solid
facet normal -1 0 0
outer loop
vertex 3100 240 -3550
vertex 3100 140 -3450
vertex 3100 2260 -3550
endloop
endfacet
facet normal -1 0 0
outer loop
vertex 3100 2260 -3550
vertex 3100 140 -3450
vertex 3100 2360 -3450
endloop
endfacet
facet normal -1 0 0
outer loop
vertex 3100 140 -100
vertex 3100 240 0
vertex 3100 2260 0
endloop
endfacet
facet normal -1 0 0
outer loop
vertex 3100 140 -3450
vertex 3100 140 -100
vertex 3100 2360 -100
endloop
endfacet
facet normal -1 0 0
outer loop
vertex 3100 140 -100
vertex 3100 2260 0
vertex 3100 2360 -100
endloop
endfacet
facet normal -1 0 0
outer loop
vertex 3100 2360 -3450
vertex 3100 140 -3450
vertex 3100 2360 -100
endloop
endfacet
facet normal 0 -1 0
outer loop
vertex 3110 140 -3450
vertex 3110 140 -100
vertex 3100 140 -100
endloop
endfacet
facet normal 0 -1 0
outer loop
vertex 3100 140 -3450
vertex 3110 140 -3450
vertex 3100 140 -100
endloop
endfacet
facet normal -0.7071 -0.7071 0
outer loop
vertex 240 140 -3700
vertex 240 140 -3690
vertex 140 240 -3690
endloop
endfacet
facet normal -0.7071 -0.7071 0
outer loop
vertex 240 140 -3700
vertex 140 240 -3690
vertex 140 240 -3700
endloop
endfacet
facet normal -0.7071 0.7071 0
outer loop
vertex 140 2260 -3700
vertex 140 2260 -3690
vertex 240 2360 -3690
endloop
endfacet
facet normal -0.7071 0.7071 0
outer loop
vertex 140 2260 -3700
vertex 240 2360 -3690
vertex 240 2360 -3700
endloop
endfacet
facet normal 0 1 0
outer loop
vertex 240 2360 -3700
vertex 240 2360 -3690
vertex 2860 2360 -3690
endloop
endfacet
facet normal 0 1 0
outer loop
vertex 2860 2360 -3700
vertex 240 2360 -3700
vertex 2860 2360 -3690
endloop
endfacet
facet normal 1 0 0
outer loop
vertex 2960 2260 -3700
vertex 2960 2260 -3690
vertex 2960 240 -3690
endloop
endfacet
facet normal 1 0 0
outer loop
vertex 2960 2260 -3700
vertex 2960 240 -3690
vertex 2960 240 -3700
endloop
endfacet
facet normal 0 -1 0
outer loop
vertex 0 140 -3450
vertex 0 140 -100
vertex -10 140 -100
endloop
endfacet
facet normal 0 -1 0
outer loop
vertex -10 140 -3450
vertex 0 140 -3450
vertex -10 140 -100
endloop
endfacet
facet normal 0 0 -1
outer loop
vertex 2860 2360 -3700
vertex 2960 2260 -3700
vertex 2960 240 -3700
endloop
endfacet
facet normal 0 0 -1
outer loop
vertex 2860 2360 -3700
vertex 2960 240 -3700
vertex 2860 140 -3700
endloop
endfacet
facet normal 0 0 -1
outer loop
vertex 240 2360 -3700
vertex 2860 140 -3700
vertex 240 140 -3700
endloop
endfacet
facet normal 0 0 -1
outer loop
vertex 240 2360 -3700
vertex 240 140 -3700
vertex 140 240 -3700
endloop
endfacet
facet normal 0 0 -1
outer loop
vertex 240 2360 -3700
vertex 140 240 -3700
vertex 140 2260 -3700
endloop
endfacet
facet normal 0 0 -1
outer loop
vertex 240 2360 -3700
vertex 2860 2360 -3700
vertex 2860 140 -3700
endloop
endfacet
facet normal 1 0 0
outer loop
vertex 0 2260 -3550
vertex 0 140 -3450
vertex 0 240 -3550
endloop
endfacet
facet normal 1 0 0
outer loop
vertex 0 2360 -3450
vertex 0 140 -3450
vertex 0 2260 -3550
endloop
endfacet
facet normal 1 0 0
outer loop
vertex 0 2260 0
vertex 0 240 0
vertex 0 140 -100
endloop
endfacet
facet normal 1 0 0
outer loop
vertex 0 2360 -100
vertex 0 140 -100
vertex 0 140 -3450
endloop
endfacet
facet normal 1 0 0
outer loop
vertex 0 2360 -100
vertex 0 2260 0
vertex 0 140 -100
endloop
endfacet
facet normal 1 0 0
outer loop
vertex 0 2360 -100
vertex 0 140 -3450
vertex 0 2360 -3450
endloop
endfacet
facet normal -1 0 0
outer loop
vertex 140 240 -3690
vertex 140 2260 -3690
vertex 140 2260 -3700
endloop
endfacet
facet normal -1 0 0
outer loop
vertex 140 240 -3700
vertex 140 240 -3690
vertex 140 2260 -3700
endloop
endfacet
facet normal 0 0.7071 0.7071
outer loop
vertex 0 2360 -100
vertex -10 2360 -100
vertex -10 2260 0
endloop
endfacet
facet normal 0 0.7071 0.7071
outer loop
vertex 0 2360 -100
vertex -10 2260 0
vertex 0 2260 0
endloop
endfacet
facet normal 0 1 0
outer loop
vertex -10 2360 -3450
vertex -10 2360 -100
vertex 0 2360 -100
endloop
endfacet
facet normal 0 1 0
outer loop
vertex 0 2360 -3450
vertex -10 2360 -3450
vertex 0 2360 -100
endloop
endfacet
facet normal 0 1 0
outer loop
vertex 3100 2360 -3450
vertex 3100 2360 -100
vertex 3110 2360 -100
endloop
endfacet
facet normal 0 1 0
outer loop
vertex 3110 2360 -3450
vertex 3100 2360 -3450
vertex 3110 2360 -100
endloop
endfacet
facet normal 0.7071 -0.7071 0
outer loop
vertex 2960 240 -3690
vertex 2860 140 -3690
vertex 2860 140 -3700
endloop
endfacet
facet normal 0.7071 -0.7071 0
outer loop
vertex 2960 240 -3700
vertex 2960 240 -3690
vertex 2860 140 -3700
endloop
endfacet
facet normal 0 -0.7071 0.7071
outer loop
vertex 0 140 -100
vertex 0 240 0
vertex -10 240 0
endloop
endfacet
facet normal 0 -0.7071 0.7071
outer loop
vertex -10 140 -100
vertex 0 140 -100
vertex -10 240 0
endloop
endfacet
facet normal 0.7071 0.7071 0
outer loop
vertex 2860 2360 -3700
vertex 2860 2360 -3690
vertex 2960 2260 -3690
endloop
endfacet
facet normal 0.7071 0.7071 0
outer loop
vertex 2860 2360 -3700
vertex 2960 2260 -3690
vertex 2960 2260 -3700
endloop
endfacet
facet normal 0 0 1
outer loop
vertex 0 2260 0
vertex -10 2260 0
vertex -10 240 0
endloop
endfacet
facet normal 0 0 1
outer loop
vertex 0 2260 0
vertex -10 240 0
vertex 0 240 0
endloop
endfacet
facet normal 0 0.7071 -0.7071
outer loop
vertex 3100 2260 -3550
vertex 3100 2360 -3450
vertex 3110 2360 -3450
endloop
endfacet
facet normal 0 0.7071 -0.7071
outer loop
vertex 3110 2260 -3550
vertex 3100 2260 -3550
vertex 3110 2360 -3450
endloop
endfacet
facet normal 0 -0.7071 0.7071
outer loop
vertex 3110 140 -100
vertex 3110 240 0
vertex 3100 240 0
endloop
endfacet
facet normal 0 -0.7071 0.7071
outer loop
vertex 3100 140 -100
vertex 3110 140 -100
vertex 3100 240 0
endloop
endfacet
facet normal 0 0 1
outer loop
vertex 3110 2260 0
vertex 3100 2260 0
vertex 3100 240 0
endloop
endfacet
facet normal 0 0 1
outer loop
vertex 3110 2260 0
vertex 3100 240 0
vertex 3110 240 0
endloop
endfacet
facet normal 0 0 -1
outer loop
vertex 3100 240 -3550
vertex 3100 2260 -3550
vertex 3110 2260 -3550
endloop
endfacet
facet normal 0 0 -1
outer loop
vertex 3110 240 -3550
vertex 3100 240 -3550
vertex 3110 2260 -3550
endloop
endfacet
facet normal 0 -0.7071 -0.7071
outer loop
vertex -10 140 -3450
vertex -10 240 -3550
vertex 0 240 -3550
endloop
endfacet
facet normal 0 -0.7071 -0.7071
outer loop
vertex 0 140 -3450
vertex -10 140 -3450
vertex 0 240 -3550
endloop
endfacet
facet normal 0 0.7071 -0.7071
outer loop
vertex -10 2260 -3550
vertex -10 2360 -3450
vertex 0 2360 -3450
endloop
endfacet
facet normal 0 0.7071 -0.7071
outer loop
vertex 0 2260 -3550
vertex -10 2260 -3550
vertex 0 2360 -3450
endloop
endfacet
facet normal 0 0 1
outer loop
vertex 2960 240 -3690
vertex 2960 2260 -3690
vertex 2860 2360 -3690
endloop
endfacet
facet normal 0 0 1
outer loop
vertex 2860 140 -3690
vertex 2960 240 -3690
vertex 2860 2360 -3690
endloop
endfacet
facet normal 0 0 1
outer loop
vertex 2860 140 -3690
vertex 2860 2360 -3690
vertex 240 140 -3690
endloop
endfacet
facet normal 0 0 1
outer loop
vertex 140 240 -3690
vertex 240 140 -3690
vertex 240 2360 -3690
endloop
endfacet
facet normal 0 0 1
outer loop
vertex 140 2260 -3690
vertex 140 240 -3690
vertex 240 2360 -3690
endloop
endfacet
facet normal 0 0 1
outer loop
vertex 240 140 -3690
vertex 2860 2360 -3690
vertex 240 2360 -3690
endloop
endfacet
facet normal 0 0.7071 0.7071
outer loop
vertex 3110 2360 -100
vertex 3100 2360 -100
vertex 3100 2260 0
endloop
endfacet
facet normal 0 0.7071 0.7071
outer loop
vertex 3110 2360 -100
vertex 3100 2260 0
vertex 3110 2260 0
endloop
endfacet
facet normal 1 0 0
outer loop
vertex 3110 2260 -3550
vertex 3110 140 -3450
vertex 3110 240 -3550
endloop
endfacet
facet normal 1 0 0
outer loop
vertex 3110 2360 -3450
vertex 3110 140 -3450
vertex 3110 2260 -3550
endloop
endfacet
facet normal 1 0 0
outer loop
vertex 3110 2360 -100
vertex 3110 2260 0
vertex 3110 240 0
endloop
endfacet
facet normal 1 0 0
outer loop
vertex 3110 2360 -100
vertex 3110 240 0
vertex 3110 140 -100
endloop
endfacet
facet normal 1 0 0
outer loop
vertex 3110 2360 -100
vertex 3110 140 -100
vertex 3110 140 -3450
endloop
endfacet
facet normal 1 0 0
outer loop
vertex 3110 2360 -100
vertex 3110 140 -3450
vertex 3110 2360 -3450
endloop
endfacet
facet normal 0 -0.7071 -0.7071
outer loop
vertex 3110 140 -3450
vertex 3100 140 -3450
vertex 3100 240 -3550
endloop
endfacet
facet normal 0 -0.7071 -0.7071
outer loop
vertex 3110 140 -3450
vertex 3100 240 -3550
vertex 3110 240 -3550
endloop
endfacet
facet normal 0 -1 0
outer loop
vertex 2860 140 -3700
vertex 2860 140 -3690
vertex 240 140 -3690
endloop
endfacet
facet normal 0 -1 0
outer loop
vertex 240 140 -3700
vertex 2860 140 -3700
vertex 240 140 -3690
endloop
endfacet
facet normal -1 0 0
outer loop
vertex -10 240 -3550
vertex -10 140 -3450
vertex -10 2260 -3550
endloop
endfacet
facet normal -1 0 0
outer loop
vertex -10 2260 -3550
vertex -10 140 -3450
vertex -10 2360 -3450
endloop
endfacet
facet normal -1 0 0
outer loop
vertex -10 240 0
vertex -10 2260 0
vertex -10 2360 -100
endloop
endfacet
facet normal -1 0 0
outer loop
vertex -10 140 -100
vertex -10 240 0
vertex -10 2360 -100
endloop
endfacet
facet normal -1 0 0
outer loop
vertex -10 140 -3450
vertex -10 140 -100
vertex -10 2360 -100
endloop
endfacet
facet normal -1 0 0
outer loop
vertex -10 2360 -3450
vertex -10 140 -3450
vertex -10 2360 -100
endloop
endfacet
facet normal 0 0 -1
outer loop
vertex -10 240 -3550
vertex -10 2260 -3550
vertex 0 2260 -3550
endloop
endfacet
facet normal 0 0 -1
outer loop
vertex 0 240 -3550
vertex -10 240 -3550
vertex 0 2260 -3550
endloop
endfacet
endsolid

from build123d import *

# Parameters (mm, degrees)
ESQUISSE1_W             = 3120
ESQUISSE1_H             = 2520
ESQUISSE1_W_2           = 3100
ESQUISSE1_H_2           = 2500
EXTRU_MINCE1_DEPTH      = 3700
ESQUISSE3_W             = 3100
ESQUISSE3_H             = 2500
BOSS_EXTRU_1_DEPTH      = 10
ENL_V_MAT_EXTRU_1_DEPTH = 4000
ESQUISSE4_W             = 190.988555417
ESQUISSE4_H             = 256.995888021
ENL_V_MAT_EXTRU_2_DEPTH = 3025.2
CHANFREIN1_SIZE         = 100
CHANFREIN2_SIZE         = 100
CHANFREIN3_SIZE         = 100


with BuildPart() as part:
    # Esquisse1 → Extru.-Mince1 (new body)
    with BuildSketch(Plane.XY):
        with Locations((1550, 1250)):
            Rectangle(ESQUISSE1_W, ESQUISSE1_H)
        with Locations((1550, 1250)):
            Rectangle(ESQUISSE1_W_2, ESQUISSE1_H_2, mode=Mode.SUBTRACT)
    extrude(amount=-EXTRU_MINCE1_DEPTH)

    # Esquisse3 → Boss.-Extru.1 (add)
    with BuildSketch(Plane(origin=(0, 0, -3700), x_dir=(-1, 0, 0), z_dir=(0, 0, -1))):
        with Locations((-1550, 1250)):
            Rectangle(ESQUISSE3_W, ESQUISSE3_H)
    extrude(amount=-BOSS_EXTRU_1_DEPTH)

    # Esquisse2 → Enlèv. mat.-Extru.1 (cut)
    with BuildSketch(Plane.XY):
        Polygon((-60, 2560), (140, 2560), (140, 2500), (2960, 2500), (2960, 2560), (3160, 2560), (3160, 2360), (2960, 2360), (140, 2360), (-60, 2360), align=None)
        Polygon((2960, 140), (140, 140), (-60, 140), (-60, -60), (140, -60), (140, 0), (2960, 0), (2960, -60), (3160, -60), (3160, 140), align=None)
    extrude(amount=-ENL_V_MAT_EXTRU_1_DEPTH, mode=Mode.SUBTRACT)


with BuildPart() as enl_v_mat_extru_1_kept_piece:
    # of the separate pieces the step leaves, the one the design keeps (enl_v_mat_extru_1_pieces_kept)
    add(part.part.solids().sort_by_distance((3110, 140, 0))[0])

    # Esquisse4 → Enlèv. mat.-Extru.2 (cut)
    with BuildSketch(Plane(origin=(0, 2360, 0), x_dir=(1, 0, 0), z_dir=(0, 1, 0))):
        with Locations((44.505722291, 3678.49794401)):
            Rectangle(ESQUISSE4_W, ESQUISSE4_H)
        with Locations((3055.494277708, 3678.49794401)):
            Rectangle(ESQUISSE4_W, ESQUISSE4_H)
    extrude(amount=-ENL_V_MAT_EXTRU_2_DEPTH, mode=Mode.SUBTRACT)


with BuildPart() as enl_v_mat_extru_2_piece_1:
    # of the separate pieces the step leaves, piece 1, a body of its own (enl_v_mat_extru_2_pieces)
    add(enl_v_mat_extru_1_kept_piece.part.solids().sort_by_distance((3110, 140, 0))[0])

    # Chanfrein3
    chanfrein3_edges = [enl_v_mat_extru_2_piece_1.edges().sort_by_distance(p)[0] for p in [
        (3105, 2360, 0),
        (3105, 140, -3550),
        (3105, 140, 0),
        (3105, 2360, -3550),
    ]]
    chamfer(chanfrein3_edges, length=CHANFREIN3_SIZE)


with BuildPart() as enl_v_mat_extru_2_piece_2:
    # of the separate pieces the step leaves, piece 2, a body of its own (enl_v_mat_extru_2_pieces)
    add(enl_v_mat_extru_1_kept_piece.part.solids().sort_by_distance((0, 140, 0))[0])

    # Chanfrein1
    chanfrein1_edges = [enl_v_mat_extru_2_piece_2.edges().sort_by_distance(p)[0] for p in [
        (-5, 140, -3550),
        (-5, 2360, 0),
        (-5, 2360, -3550),
        (-5, 140, 0),
    ]]
    chamfer(chanfrein1_edges, length=CHANFREIN1_SIZE)


with BuildPart() as enl_v_mat_extru_2_piece_3:
    # of the separate pieces the step leaves, piece 3, a body of its own (enl_v_mat_extru_2_pieces)
    add(enl_v_mat_extru_1_kept_piece.part.solids().sort_by_distance((2960, 140, -3690))[0])

    # Chanfrein2
    chanfrein2_edges = [enl_v_mat_extru_2_piece_3.edges().sort_by_distance(p)[0] for p in [
        (140, 140, -3695),
        (2960, 140, -3695),
        (2960, 2360, -3695),
        (140, 2360, -3695),
    ]]
    chamfer(chanfrein2_edges, length=CHANFREIN2_SIZE)


solid = Compound([enl_v_mat_extru_2_piece_1.part, enl_v_mat_extru_2_piece_2.part, enl_v_mat_extru_2_piece_3.part])
